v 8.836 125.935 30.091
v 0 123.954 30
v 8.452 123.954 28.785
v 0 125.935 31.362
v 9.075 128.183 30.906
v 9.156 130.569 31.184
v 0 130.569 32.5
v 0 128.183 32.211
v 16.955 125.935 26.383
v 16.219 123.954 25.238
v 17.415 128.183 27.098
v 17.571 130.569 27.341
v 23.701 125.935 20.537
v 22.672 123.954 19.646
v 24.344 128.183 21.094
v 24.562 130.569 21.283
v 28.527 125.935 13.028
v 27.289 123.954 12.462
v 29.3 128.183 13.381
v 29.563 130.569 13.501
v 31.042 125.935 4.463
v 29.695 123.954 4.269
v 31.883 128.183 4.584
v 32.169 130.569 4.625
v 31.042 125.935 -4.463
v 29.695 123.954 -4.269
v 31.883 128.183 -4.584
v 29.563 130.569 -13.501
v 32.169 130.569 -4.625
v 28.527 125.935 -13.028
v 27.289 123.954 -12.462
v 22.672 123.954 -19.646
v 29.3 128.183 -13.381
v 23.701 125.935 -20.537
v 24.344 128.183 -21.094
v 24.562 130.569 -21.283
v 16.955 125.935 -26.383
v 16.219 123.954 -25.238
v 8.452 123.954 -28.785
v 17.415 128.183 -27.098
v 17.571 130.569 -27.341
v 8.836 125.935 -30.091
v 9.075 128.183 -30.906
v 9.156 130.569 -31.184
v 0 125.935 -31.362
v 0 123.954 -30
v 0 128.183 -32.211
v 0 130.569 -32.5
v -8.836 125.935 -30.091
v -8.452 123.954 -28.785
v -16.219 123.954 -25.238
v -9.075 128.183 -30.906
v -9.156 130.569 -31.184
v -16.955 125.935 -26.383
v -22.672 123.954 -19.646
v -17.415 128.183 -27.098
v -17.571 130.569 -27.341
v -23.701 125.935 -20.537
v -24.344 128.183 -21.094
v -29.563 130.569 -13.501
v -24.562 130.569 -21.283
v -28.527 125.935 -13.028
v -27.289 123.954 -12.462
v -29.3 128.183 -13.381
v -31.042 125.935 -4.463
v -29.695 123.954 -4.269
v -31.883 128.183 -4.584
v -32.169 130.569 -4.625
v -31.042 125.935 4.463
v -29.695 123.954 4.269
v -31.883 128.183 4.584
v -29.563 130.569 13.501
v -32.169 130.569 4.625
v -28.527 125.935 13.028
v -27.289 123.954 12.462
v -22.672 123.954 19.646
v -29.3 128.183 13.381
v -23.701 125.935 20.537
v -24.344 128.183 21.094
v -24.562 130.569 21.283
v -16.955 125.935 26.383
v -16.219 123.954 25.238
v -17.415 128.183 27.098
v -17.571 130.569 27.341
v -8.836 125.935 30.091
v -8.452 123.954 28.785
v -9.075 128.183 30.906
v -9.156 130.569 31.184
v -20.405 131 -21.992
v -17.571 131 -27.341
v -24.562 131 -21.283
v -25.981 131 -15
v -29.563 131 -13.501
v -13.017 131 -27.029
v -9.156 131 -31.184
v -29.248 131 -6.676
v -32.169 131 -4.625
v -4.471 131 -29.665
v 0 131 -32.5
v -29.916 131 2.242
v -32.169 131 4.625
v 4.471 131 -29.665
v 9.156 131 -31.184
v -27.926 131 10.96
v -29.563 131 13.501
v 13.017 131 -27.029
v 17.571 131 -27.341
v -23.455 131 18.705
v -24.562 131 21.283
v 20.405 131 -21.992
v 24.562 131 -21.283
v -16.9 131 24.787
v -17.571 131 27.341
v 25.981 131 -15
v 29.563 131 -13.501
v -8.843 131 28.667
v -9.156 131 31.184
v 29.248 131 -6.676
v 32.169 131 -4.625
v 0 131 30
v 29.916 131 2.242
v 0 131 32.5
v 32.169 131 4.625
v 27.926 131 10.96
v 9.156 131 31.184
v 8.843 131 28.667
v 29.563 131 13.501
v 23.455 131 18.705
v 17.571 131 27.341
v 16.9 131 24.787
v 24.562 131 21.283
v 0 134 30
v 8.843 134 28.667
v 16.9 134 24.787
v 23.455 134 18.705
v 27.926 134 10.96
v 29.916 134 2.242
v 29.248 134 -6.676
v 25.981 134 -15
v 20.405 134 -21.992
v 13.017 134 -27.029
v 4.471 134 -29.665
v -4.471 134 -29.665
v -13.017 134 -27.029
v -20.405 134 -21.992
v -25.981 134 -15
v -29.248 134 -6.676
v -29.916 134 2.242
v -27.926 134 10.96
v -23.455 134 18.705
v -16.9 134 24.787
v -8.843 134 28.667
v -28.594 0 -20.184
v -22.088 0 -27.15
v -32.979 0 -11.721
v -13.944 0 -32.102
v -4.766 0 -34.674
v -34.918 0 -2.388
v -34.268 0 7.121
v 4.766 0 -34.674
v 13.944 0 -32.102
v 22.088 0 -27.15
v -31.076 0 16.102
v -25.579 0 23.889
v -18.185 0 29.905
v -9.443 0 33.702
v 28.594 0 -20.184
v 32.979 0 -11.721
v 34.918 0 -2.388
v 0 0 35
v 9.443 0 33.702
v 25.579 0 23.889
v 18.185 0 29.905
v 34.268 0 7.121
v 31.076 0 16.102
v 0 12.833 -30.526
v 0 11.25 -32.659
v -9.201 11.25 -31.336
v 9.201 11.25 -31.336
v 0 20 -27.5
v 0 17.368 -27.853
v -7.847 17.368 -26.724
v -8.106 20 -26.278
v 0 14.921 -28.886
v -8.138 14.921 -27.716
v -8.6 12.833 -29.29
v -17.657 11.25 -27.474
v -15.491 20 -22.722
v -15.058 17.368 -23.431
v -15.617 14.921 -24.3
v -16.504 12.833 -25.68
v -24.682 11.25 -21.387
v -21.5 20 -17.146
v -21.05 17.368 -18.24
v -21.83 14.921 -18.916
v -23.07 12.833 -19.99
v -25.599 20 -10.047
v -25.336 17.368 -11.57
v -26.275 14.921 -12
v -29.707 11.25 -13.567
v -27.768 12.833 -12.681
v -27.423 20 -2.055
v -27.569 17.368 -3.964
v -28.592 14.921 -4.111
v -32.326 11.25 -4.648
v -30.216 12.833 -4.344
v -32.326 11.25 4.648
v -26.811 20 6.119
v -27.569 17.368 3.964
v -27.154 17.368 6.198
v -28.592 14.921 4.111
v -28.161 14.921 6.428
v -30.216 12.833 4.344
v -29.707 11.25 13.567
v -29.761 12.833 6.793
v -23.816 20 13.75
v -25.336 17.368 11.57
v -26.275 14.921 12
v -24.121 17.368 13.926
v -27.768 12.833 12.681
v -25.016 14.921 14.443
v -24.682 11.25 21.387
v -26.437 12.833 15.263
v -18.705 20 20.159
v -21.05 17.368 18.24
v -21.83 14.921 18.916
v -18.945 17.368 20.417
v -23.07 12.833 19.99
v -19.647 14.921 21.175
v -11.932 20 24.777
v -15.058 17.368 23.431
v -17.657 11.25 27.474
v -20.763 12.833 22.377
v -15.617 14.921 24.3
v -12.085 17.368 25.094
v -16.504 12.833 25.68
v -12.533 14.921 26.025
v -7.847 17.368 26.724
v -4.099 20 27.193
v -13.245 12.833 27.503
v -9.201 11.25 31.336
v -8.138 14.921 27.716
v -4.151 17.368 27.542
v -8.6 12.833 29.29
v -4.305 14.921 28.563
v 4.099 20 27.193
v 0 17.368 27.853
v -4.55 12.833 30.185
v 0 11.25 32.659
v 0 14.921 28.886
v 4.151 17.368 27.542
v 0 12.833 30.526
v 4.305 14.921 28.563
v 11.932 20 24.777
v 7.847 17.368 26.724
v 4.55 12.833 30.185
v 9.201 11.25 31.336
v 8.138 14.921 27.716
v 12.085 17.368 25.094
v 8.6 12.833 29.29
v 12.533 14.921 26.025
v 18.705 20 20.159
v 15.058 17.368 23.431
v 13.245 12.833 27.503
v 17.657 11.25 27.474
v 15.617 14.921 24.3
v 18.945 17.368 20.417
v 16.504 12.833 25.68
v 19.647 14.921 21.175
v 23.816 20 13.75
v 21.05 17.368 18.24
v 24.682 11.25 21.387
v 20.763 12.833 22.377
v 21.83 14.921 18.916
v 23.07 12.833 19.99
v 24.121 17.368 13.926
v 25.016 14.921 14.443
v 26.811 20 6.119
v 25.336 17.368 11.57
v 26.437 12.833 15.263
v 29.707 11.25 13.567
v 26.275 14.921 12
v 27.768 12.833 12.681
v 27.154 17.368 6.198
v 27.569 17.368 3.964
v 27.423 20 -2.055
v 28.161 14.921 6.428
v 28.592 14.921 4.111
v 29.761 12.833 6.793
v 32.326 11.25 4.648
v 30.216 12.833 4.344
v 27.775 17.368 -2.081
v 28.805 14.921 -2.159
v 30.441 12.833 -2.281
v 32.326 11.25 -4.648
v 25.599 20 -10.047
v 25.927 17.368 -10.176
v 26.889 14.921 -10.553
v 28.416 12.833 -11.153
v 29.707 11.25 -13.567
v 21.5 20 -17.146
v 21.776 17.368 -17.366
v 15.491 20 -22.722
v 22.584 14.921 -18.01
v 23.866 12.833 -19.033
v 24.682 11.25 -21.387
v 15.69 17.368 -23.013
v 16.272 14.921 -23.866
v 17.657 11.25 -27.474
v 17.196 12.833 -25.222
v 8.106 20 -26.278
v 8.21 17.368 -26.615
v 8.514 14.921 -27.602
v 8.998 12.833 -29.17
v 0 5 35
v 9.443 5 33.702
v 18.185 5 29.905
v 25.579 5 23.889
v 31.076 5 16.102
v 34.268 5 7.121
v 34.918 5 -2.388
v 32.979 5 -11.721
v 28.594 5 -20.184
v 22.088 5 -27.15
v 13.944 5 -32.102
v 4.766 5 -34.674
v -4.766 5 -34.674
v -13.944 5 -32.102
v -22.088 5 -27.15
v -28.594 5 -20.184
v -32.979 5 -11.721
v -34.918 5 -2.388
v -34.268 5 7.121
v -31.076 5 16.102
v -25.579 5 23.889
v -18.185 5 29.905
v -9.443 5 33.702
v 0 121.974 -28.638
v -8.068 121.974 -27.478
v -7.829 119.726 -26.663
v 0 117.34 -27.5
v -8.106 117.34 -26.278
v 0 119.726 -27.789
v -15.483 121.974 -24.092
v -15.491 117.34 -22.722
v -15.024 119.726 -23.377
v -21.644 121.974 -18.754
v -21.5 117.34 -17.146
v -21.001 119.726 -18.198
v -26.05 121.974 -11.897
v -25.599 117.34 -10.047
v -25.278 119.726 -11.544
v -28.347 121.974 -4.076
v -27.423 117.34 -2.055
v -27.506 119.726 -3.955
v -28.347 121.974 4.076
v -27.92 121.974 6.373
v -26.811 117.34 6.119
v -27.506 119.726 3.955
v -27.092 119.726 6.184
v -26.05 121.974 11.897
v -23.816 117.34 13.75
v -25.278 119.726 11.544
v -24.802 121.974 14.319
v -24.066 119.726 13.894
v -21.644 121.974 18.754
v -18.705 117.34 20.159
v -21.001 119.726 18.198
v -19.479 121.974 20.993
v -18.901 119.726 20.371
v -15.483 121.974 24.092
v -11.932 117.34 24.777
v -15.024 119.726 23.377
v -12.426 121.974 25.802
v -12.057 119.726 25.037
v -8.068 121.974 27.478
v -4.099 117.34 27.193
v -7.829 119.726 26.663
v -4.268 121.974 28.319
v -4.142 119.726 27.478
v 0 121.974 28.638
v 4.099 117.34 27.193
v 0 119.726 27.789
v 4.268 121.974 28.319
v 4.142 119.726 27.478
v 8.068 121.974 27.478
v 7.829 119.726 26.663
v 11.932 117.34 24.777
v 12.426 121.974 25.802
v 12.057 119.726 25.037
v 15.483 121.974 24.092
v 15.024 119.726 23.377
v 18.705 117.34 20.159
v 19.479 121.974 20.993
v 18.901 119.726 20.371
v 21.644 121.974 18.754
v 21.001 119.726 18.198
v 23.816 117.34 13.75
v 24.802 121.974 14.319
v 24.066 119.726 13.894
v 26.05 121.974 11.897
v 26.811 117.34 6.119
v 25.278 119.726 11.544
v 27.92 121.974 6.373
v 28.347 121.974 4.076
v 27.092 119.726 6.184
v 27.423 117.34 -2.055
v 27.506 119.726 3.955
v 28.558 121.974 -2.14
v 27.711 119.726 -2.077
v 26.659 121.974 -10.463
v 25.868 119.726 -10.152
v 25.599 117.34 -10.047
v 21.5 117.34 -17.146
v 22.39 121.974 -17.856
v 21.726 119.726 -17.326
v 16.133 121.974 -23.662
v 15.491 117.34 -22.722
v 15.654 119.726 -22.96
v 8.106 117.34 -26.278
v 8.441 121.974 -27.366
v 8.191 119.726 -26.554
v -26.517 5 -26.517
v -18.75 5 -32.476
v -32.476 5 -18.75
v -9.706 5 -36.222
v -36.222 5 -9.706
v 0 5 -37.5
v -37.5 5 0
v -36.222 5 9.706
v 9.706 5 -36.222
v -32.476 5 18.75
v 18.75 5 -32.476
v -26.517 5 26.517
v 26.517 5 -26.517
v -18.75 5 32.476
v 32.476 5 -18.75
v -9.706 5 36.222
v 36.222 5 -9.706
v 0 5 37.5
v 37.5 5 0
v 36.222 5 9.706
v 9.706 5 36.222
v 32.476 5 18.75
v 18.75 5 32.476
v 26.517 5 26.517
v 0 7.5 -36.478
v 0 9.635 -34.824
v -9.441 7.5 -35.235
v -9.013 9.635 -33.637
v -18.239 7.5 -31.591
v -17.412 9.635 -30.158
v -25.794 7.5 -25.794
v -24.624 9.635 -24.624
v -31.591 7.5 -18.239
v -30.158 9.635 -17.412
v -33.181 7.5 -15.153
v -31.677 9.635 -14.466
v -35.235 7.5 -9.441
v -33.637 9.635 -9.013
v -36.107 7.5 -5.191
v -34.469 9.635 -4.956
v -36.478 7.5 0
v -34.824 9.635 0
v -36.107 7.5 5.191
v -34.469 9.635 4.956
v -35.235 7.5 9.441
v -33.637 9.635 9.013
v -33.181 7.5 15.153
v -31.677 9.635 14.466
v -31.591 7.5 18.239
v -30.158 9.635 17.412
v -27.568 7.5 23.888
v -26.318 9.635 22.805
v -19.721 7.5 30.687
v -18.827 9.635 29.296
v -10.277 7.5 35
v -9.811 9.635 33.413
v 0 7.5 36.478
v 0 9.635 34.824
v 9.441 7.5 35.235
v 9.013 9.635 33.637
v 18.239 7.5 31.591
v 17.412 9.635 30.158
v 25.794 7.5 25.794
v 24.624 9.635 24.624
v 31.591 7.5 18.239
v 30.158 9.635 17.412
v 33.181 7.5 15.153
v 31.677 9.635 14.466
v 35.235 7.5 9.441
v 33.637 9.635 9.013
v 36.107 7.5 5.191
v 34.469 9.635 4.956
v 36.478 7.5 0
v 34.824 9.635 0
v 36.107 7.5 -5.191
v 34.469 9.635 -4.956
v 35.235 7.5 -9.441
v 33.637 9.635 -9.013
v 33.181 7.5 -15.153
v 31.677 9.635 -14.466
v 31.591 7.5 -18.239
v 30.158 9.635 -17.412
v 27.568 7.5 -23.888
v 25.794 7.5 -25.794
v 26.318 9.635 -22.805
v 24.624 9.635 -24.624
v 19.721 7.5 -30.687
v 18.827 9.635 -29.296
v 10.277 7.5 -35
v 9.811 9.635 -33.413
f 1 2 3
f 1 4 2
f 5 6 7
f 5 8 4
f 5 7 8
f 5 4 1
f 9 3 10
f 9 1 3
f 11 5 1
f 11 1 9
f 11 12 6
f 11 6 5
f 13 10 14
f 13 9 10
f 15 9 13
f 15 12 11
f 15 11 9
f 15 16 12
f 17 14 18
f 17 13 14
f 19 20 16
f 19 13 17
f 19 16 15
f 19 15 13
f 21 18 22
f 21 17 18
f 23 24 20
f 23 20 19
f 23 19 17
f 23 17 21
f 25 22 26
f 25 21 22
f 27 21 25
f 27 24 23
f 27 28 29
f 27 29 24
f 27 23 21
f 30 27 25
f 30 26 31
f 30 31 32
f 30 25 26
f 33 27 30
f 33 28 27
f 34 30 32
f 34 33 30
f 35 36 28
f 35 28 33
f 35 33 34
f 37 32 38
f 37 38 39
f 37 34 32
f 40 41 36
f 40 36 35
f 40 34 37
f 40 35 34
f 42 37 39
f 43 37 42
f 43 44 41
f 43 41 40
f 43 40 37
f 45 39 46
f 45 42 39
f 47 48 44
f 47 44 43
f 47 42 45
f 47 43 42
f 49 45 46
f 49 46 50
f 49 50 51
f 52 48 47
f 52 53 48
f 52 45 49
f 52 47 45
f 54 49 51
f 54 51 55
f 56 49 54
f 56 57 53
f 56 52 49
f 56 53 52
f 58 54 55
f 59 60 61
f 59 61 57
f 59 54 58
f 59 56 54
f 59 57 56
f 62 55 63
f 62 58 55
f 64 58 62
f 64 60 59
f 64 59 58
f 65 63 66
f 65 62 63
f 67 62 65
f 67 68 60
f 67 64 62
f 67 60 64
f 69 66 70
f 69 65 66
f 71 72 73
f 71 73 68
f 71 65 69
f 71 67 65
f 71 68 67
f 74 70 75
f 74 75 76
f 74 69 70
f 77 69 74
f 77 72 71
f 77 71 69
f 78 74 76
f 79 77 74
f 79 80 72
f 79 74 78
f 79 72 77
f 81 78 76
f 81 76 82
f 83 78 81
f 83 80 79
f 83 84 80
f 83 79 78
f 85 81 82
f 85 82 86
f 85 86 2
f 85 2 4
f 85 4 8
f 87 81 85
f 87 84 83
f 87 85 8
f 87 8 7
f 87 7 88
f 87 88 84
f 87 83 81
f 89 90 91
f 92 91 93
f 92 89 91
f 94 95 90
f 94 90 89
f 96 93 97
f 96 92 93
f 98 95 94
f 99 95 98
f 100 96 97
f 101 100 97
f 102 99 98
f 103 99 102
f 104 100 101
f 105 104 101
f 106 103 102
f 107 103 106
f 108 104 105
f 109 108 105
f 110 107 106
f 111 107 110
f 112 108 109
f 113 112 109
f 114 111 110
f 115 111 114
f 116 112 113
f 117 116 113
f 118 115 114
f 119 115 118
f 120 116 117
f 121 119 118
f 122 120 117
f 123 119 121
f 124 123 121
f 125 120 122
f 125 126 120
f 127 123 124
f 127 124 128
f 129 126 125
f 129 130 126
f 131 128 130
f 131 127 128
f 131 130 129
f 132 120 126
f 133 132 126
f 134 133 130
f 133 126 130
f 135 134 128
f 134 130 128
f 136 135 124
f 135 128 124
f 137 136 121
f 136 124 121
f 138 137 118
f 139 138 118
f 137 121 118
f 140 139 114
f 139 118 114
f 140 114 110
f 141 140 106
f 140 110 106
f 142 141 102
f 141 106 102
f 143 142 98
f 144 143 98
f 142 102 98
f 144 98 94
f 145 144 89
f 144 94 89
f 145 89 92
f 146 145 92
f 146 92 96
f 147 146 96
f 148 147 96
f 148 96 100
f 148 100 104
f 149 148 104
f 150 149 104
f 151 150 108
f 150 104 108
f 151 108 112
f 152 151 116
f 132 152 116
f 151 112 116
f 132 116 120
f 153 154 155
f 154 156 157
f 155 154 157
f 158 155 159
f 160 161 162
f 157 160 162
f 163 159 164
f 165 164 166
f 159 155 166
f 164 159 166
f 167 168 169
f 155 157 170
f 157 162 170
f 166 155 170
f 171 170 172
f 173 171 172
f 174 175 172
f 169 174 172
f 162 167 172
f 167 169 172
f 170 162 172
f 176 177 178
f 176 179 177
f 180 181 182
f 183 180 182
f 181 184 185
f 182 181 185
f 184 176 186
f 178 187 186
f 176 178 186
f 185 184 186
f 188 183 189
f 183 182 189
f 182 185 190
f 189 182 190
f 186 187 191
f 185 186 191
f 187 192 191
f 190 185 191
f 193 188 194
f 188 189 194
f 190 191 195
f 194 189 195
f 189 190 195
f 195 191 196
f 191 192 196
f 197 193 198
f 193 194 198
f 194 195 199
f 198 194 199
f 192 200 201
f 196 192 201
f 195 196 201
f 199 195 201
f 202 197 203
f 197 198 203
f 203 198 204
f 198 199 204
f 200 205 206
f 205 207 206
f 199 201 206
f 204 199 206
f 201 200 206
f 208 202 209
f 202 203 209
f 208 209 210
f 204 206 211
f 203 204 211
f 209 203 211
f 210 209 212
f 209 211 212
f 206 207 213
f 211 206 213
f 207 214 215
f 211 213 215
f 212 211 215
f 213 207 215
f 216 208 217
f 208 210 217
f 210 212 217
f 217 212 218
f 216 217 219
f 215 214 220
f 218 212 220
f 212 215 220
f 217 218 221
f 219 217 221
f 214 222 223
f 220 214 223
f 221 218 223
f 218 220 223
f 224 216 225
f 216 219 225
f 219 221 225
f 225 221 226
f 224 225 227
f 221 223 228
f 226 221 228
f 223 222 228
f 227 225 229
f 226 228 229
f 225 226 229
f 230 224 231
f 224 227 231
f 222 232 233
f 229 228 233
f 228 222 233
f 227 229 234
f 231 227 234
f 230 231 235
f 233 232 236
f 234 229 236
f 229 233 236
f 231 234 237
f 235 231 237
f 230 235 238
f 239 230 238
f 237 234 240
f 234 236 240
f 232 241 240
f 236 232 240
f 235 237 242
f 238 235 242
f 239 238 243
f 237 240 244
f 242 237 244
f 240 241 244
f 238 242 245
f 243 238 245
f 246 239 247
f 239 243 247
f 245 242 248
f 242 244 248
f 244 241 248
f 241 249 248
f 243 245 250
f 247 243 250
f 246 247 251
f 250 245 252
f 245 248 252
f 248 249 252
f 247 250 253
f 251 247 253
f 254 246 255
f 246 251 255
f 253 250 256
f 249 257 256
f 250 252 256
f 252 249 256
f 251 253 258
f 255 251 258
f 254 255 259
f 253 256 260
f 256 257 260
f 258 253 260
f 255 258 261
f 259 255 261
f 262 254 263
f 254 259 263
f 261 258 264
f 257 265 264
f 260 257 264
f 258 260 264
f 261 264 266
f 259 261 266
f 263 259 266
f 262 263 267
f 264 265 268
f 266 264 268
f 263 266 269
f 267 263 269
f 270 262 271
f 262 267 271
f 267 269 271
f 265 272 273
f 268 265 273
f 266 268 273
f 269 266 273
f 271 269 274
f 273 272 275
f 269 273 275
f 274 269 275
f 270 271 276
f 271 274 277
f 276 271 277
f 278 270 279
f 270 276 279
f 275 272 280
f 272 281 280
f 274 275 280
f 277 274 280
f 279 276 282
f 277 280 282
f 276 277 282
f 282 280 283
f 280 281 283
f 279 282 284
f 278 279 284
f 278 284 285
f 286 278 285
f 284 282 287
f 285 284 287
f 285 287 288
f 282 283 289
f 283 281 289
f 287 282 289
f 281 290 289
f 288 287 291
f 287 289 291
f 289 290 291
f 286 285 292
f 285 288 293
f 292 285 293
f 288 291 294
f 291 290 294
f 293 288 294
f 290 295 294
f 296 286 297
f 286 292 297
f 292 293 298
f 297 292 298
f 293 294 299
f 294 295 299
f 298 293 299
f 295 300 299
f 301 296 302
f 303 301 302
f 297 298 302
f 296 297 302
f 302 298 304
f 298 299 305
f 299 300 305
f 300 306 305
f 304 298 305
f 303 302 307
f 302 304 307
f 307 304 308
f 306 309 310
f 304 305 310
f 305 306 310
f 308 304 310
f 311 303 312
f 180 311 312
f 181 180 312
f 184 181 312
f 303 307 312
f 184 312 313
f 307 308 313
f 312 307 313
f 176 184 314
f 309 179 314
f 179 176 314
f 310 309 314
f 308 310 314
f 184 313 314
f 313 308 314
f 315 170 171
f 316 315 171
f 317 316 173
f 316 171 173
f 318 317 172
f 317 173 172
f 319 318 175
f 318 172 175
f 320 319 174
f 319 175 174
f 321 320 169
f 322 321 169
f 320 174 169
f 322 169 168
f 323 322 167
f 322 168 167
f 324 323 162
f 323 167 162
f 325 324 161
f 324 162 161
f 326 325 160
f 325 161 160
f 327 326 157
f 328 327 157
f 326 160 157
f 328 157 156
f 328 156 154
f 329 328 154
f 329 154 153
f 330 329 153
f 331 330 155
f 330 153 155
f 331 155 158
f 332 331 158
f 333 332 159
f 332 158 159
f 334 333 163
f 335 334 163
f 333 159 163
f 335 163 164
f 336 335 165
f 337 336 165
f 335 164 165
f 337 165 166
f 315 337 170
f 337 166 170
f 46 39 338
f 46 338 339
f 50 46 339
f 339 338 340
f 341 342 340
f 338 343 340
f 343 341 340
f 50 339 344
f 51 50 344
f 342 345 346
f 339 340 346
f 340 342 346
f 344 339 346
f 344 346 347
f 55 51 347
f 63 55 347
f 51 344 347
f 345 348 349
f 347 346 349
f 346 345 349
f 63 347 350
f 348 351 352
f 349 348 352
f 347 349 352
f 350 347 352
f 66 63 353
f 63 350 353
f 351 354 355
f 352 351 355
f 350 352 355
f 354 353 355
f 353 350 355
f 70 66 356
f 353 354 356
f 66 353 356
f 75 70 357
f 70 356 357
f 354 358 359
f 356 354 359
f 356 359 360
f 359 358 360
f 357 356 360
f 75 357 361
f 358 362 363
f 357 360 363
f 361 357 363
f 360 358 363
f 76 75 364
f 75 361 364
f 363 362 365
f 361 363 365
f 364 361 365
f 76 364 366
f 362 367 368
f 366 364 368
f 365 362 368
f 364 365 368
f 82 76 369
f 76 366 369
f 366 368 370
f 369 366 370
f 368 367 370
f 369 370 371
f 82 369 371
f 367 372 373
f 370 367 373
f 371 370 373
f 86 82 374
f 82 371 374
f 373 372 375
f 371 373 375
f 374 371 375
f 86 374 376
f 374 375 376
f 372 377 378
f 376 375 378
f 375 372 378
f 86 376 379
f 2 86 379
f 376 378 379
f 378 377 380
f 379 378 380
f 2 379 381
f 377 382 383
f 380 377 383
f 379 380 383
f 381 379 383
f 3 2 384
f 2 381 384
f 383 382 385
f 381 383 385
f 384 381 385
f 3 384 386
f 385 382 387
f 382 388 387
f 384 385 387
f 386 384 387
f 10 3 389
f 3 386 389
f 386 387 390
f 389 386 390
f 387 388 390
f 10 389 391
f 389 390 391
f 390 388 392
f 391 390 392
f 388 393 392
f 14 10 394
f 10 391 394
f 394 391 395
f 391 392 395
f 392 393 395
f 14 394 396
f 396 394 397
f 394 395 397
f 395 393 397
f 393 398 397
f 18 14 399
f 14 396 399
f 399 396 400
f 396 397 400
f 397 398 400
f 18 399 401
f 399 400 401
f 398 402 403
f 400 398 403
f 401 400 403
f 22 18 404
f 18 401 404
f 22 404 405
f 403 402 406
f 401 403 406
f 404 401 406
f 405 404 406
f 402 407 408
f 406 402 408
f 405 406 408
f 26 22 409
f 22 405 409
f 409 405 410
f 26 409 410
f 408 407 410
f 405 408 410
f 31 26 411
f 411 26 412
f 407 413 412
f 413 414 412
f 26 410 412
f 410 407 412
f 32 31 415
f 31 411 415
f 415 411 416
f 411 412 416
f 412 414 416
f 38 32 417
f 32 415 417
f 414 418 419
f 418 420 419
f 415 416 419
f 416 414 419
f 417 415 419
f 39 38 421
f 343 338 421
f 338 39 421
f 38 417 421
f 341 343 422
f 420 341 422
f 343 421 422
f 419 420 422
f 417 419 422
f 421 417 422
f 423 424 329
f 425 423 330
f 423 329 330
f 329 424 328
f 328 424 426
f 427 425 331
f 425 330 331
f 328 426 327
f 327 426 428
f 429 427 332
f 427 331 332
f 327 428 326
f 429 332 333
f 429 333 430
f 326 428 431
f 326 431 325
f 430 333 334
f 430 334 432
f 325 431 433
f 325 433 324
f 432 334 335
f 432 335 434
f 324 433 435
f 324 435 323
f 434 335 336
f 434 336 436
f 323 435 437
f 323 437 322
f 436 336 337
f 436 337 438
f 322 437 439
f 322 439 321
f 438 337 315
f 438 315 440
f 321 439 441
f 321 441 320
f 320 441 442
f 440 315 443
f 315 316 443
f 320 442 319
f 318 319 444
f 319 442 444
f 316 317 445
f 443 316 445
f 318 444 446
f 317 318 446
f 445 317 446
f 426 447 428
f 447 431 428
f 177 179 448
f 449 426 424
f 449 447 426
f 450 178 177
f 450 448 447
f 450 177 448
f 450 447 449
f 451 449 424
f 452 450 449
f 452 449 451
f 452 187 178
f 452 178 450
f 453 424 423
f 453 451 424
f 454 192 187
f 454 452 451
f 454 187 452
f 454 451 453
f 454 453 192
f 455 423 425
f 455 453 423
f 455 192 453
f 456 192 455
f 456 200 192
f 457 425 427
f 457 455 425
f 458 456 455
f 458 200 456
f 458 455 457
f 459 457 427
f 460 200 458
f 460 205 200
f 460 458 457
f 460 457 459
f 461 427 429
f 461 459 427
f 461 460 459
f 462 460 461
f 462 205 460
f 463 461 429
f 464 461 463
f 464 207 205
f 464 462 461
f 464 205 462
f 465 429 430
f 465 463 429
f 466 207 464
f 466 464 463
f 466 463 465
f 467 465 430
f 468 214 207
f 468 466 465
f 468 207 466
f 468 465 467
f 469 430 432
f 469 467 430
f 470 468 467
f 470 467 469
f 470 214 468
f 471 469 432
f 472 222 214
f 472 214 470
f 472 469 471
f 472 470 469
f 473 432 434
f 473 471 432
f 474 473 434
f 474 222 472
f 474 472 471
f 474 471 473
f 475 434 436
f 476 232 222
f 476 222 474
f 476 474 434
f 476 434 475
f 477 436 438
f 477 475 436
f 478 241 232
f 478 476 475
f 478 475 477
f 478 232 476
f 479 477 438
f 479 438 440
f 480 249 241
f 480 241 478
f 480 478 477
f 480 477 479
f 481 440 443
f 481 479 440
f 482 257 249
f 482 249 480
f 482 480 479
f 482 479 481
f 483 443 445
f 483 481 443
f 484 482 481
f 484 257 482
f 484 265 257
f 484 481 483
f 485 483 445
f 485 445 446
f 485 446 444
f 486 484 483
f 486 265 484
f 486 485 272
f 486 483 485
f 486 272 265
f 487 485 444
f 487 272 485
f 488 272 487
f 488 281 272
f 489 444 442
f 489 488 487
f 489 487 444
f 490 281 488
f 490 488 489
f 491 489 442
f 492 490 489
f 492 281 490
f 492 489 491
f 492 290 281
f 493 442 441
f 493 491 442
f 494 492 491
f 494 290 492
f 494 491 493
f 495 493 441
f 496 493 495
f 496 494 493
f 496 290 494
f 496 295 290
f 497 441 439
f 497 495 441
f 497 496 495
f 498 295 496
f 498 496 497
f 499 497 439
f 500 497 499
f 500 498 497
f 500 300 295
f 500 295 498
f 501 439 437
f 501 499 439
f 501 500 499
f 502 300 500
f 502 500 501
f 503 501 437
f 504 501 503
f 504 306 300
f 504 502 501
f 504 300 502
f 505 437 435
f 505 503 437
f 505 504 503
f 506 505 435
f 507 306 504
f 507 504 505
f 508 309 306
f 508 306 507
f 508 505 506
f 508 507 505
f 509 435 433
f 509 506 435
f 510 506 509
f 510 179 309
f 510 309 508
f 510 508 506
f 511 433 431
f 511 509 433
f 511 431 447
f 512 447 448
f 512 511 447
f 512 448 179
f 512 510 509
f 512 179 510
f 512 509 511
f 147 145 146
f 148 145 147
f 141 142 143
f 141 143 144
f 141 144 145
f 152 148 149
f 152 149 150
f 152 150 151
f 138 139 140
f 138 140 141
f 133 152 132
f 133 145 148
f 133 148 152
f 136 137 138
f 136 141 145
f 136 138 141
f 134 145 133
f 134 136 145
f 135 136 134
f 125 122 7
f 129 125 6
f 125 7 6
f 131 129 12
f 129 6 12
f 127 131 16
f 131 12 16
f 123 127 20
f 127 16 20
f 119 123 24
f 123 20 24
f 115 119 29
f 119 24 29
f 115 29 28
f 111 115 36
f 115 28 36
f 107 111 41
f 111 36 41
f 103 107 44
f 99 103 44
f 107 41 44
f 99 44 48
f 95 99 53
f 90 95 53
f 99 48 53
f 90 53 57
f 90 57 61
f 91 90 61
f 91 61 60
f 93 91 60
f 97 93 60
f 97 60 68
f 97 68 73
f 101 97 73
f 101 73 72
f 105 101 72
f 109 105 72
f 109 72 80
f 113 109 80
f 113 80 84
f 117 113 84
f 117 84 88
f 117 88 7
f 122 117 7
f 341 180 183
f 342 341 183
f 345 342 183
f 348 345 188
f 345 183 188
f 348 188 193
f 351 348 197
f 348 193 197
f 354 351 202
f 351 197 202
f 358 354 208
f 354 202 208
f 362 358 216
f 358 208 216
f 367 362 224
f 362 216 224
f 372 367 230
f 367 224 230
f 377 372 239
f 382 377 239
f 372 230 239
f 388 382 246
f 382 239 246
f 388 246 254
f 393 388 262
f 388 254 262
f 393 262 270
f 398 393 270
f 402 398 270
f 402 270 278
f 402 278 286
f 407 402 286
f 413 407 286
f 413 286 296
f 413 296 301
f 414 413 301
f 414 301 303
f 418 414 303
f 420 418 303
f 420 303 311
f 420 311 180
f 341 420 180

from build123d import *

# Parameters (mm, degrees)
SKETCH1_R           = 35
BOSS_EXTRUDE1_DEPTH = 5
SKETCH3_R           = 37.5
BOSS_EXTRUDE2_DEPTH = 5
SKETCH4_R           = 27.5
BOSS_EXTRUDE5_DEPTH = 116
SKETCH5_R           = 32.5
BOSS_EXTRUDE6_DEPTH = 5
SKETCH6_R           = 30
BOSS_EXTRUDE7_DEPTH = 3
FILLET1_R           = 10
FILLET2_R           = 10


with BuildPart() as part:
    # Sketch1 → Boss-Extrude1 (new body)
    with BuildSketch(Plane(origin=(0, 0, 0), x_dir=(1, 0, 0), z_dir=(0, 1, 0))):
        with Locations(Location((0, 0, 0), (0, 0, 270))):
            Circle(SKETCH1_R)
    extrude(amount=BOSS_EXTRUDE1_DEPTH)

    # Sketch3 → Boss-Extrude2 (add)
    with BuildSketch(Plane(origin=(0, 5, 0), x_dir=(1, 0, 0), z_dir=(0, 1, 0))):
        with Locations(Location((0, 0, 0), (0, 0, 270))):
            Circle(SKETCH3_R)
    extrude(amount=BOSS_EXTRUDE2_DEPTH)

    # Sketch4 → Boss-Extrude5 (add)
    with BuildSketch(Plane(origin=(0, 10, 0), x_dir=(1, 0, 0), z_dir=(0, 1, 0))):
        with Locations(Location((0, 0, 0), (0, 0, 90))):
            Circle(SKETCH4_R)
    extrude(amount=BOSS_EXTRUDE5_DEPTH)

    # Sketch5 → Boss-Extrude6 (add)
    with BuildSketch(Plane(origin=(0, 126, 0), x_dir=(1, 0, 0), z_dir=(0, 1, 0))):
        with Locations(Location((0, 0, 0), (0, 0, 270))):
            Circle(SKETCH5_R)
    extrude(amount=BOSS_EXTRUDE6_DEPTH)

    # Sketch6 → Boss-Extrude7 (add)
    with BuildSketch(Plane(origin=(0, 131, 0), x_dir=(1, 0, 0), z_dir=(0, 1, 0))):
        with Locations(Location((0, 0, 0), (0, 0, 270))):
            Circle(SKETCH6_R)
    extrude(amount=BOSS_EXTRUDE7_DEPTH)

    # Fillet1
    # the kernel refuses this fillet: 10 mm, written as the material it adds along each edge
    with BuildSketch(Plane(origin=(0, 10, 0), x_dir=(0, 0, -1), z_dir=(1, 0, 0))) as fillet1_piece_1:
        with BuildLine():
            CenterArc((27.5 + FILLET1_R, FILLET1_R), FILLET1_R, 180, 90)
            Line((27.5 + FILLET1_R, 0), (27.5 + FILLET1_R, -FILLET1_R * 0.02))
            Line((27.5 + FILLET1_R, -FILLET1_R * 0.02), (27.5 - FILLET1_R * 0.02, -FILLET1_R * 0.02))
            Line((27.5 - FILLET1_R * 0.02, -FILLET1_R * 0.02), (27.5 - FILLET1_R * 0.02, FILLET1_R))
            Line((27.5 - FILLET1_R * 0.02, FILLET1_R), (27.5, FILLET1_R))
        make_face()
    revolve(axis=Axis((0, 10, 0), (0, 1, 0)))
    with BuildSketch(Plane(origin=(0, 126, 0), x_dir=(0, 0, -1), z_dir=(1, 0, 0))) as fillet1_piece_2:
        with BuildLine():
            CenterArc((37.5, -8.660254038), FILLET1_R, 120, 60)
            Line((27.5, -8.660254038), (27.3, -8.660254038))
            Line((27.3, -8.660254038), (27.3, 0))
            Line((27.3, 0), (27.5, 0.2))
            ThreePointArc((27.5, 0.2), (30, 0.2), (32.4, 0.173205081))
            Line((32.4, 0.173205081), (32.5, 0))
        make_face()
    revolve(axis=Axis((0, 126, 0), (0, 1, 0)))

    # Fillet2
    # the kernel refuses this fillet: 10 mm, written as the material it takes off along each edge
    with BuildSketch(Plane(origin=(0, 126, 0), x_dir=(0, 0, 1), z_dir=(-1, 0, 0))) as fillet2_piece_1:
        with BuildLine():
            CenterArc((22.5, 4.568502517), FILLET2_R, 318.590377891, 41.409622109)
            Line((32.5, 4.568502517), (32.7, 4.568502517))
            Line((32.7, 4.568502517), (32.7, 0))
            Line((32.7, 0), (32.6, -0.173205081))
            ThreePointArc((32.6, -0.173205081), (31.293504258, -1.076098804), (30.15, -2.178163326))
            Line((30.15, -2.178163326), (30, -2.04587576))
        make_face()
    revolve(axis=Axis((0, 126, 0), (0, 1, 0)), revolution_arc=180, mode=Mode.SUBTRACT)
    with BuildSketch(Plane(origin=(0, 10, 0), x_dir=(0, 0, -1), z_dir=(1, 0, 0))) as fillet2_piece_2:
        with BuildLine():
            CenterArc((27.817541634, -7.5), FILLET2_R, 14.477512186, 46.567463442)
            Line((37.5, -5), (37.693649167, -4.95))
            ThreePointArc((37.693649167, -4.95), (37.7, -2.5), (37.7, 0))
            Line((37.7, 0), (37.5, 0.2))
            ThreePointArc((37.5, 0.2), (35.05, 0.511190802), (32.755595401, 1.425))
            Line((32.755595401, 1.425), (32.658770817, 1.25))
        make_face()
    revolve(axis=Axis((0, 10, 0), (0, 1, 0)), revolution_arc=180, mode=Mode.SUBTRACT)
    with BuildSketch(Plane(origin=(0, 10, 0), x_dir=(0, 0, 1), z_dir=(-1, 0, 0))) as fillet2_piece_3:
        with BuildLine():
            CenterArc((27.817541634, -7.5), FILLET2_R, 14.477512186, 46.567463442)
            Line((37.5, -5), (37.693649167, -4.95))
            ThreePointArc((37.693649167, -4.95), (37.7, -2.5), (37.7, 0))
            Line((37.7, 0), (37.5, 0.2))
            ThreePointArc((37.5, 0.2), (35.05, 0.511190802), (32.755595401, 1.425))
            Line((32.755595401, 1.425), (32.658770817, 1.25))
        make_face()
    revolve(axis=Axis((0, 10, 0), (0, 1, 0)), revolution_arc=180, mode=Mode.SUBTRACT)
    with BuildSketch(Plane(origin=(0, 126, 0), x_dir=(0, 0, -1), z_dir=(1, 0, 0))) as fillet2_piece_4:
        with BuildLine():
            CenterArc((22.5, 4.568502517), FILLET2_R, 318.590377891, 41.409622109)
            Line((32.5, 4.568502517), (32.7, 4.568502517))
            Line((32.7, 4.568502517), (32.7, 0))
            Line((32.7, 0), (32.6, -0.173205081))
            ThreePointArc((32.6, -0.173205081), (31.293504258, -1.076098804), (30.15, -2.178163326))
            Line((30.15, -2.178163326), (30, -2.04587576))
        make_face()
    revolve(axis=Axis((0, 126, 0), (0, 1, 0)), revolution_arc=180, mode=Mode.SUBTRACT)


solid = part.part
